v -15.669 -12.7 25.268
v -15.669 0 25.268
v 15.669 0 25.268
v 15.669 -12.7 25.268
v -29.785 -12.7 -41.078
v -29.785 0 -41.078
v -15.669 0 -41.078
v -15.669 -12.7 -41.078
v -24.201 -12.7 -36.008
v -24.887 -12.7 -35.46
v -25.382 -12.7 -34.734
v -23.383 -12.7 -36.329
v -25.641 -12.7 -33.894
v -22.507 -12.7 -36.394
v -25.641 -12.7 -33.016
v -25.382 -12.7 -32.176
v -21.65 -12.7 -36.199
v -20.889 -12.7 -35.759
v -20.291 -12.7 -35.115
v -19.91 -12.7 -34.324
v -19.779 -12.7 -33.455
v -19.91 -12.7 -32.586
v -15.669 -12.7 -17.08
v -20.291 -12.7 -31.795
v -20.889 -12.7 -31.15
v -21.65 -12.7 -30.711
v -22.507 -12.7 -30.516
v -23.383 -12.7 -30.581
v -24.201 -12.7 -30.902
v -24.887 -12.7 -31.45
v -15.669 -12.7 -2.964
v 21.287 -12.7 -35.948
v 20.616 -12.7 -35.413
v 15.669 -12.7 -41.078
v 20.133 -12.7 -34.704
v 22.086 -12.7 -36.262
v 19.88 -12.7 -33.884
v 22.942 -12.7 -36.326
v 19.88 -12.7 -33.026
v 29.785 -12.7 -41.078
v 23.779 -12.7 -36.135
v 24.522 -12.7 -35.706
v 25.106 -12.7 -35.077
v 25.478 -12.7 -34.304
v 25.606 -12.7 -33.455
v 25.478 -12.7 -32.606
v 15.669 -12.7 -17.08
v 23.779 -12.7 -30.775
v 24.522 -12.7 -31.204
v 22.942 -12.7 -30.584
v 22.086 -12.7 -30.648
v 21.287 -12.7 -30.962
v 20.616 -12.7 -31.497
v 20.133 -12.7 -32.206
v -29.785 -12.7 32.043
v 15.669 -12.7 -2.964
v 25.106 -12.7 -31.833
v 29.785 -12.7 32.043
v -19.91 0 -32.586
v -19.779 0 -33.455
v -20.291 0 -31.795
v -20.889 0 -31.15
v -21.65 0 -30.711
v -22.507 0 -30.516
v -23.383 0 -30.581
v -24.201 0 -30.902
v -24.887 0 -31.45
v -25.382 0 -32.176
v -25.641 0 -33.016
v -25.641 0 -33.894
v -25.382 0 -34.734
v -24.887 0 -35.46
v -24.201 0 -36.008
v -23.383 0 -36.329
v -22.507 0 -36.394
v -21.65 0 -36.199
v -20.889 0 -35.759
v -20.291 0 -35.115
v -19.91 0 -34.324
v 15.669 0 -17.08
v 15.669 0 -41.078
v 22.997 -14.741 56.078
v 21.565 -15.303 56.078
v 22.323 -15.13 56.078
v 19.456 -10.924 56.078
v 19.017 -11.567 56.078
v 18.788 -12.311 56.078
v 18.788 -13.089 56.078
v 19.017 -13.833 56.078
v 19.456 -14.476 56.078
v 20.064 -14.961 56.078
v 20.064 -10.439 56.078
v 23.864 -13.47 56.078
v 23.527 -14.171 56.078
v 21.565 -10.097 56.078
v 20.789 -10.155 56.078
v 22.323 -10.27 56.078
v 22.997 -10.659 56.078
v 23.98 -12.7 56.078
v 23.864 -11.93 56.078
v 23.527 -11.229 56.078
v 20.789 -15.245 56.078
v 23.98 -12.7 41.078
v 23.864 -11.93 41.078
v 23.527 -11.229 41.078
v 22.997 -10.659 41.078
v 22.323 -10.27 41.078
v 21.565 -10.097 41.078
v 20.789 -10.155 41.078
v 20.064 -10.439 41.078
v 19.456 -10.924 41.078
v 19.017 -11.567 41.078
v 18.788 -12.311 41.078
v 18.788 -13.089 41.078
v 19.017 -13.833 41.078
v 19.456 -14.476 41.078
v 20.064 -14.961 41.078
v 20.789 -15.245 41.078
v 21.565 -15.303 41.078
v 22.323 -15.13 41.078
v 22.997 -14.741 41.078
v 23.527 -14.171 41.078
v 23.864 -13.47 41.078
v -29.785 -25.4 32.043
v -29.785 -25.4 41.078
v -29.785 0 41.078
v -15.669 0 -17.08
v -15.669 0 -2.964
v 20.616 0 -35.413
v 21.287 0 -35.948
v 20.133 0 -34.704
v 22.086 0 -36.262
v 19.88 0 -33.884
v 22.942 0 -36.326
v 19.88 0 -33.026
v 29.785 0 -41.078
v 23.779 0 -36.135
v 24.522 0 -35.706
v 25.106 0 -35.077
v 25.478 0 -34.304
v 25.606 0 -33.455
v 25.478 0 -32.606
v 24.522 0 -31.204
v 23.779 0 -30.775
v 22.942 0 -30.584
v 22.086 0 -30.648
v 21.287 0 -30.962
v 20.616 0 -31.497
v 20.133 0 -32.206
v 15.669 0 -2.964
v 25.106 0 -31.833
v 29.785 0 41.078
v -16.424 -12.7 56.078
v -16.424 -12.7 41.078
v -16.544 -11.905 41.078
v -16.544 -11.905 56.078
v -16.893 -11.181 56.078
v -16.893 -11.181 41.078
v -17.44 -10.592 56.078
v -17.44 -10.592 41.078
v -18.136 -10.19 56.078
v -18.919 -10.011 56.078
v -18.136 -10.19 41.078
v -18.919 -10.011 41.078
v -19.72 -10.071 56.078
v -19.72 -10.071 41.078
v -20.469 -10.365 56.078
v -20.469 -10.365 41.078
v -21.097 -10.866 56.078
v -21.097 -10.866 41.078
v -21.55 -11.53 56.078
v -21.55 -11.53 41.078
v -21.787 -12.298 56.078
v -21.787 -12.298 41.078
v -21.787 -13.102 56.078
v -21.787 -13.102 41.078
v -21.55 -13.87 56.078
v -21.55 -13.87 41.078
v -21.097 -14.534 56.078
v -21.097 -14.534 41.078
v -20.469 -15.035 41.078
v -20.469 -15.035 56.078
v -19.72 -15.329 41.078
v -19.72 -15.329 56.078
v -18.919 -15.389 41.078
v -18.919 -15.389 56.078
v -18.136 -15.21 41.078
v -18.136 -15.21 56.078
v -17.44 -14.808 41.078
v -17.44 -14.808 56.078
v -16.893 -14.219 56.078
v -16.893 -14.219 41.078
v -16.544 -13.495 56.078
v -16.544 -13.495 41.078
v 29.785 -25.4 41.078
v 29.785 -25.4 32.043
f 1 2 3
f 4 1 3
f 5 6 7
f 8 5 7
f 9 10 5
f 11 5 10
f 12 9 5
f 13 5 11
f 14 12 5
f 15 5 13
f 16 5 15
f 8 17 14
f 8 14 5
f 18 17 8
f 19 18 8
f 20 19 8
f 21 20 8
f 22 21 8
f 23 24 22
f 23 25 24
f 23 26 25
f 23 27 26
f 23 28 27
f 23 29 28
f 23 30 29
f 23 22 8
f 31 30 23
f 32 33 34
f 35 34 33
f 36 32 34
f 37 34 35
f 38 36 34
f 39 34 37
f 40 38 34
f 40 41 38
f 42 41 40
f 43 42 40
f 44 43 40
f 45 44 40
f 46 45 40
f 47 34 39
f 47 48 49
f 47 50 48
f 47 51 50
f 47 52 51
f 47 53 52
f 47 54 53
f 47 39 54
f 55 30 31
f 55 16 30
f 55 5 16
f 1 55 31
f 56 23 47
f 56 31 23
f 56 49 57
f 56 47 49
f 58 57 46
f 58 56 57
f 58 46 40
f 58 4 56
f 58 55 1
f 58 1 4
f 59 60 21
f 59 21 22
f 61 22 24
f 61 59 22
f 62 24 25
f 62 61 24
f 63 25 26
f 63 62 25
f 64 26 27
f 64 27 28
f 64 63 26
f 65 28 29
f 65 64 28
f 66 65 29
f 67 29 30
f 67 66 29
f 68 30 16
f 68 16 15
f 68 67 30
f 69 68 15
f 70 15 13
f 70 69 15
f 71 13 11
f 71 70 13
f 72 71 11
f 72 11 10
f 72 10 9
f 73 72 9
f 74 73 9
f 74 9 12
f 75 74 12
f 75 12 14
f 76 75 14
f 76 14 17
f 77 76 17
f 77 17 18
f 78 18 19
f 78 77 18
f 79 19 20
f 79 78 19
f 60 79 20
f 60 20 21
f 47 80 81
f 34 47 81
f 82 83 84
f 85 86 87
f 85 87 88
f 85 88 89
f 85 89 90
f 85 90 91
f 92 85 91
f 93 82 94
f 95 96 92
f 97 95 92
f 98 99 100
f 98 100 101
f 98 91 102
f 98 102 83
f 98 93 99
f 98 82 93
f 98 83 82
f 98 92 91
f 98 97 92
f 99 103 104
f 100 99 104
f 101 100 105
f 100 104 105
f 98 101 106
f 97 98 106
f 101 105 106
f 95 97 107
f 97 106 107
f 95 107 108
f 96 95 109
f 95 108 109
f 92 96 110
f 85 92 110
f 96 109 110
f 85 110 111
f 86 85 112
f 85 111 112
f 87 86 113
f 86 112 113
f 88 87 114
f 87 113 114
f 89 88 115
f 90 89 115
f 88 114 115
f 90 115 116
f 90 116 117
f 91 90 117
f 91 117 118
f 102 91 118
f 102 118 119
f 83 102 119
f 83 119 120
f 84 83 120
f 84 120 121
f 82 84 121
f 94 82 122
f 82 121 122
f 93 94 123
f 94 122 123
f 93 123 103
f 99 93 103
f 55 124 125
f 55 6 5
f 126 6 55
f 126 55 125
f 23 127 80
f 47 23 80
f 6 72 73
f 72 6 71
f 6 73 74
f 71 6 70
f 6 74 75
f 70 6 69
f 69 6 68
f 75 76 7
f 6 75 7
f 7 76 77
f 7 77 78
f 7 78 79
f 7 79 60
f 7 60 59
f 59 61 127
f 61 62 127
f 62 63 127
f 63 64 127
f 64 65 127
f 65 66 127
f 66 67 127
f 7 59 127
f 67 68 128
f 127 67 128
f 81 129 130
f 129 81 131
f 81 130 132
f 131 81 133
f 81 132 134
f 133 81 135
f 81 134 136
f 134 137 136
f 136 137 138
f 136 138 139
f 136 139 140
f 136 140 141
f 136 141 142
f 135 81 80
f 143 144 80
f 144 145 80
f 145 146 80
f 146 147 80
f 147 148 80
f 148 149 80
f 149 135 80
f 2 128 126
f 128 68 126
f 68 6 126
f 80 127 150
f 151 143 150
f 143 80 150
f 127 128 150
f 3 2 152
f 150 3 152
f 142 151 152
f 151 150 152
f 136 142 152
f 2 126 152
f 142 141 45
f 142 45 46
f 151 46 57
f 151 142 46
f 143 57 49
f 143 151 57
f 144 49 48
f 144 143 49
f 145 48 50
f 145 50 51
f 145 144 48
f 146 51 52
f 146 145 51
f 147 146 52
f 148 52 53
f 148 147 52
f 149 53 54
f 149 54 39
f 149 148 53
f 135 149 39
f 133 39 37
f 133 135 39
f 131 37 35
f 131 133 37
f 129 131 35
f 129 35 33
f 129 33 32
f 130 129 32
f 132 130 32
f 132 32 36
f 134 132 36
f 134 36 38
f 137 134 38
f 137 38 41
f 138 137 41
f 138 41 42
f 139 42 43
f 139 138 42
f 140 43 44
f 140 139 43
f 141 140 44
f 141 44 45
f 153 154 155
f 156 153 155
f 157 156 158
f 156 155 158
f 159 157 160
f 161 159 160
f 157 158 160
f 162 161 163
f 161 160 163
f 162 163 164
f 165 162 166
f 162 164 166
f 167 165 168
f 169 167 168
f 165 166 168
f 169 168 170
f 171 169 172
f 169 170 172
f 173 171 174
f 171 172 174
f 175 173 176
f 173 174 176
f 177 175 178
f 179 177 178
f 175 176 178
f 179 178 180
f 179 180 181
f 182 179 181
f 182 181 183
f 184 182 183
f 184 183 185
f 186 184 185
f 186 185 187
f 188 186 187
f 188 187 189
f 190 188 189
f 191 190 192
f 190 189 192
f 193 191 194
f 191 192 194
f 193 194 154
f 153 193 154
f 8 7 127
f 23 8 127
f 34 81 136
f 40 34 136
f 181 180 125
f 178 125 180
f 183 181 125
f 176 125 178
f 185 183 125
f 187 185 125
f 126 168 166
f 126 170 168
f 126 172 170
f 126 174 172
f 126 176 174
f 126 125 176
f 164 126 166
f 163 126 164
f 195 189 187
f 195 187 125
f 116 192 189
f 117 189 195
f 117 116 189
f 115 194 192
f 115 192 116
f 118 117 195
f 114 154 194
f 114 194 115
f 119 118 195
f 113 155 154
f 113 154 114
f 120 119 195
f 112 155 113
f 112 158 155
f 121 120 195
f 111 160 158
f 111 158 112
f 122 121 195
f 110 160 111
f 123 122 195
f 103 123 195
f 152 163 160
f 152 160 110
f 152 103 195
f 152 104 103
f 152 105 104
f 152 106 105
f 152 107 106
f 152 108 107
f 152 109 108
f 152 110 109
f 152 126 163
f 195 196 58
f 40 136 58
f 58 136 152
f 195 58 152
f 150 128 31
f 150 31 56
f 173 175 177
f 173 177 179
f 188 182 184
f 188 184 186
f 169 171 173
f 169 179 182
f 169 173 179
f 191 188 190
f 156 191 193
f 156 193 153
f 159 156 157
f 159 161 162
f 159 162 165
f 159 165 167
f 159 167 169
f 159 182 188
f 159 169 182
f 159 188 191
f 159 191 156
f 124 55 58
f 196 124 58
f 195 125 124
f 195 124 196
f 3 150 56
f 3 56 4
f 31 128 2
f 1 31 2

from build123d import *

# Parameters (mm, degrees)
F0_R     = 2.947507
F0_R_2   = 2.879107
F0_W     = 31.337534
F0_H     = 28.232014
F1_DEPTH = 12.7
F0_W_2   = 59.569548
F0_H_2   = 9.034242
F2_DEPTH = 25.4
F3_R     = 2.696098
F4_DEPTH = 15
F3_R_2   = 2.610721
F5_DEPTH = 15


with BuildPart() as f1:
    # F0 (on Front) → F1 (new body)
    with BuildSketch(Plane.XZ):
        Polygon((29.784774, 32.043338), (-29.784774, 32.043338), (-29.784774, -41.07758), (-15.668767, -41.07758), (-15.668767, -17.080368), (15.668767, -17.080368), (15.668767, -41.07758), (29.784774, -41.07758), align=None)
        with Locations((-22.72677, -33.454936)):
            Circle(F0_R, mode=Mode.SUBTRACT)
        with Locations((22.72677, -33.454936)):
            Circle(F0_R_2, mode=Mode.SUBTRACT)
        with Locations((0, 11.151646)):
            Rectangle(F0_W, F0_H, mode=Mode.SUBTRACT)
    extrude(amount=F1_DEPTH)

    # F0 (on Front) → F2 (join)
    with BuildSketch(Plane.XZ):
        with Locations((0, 36.560459)):
            Rectangle(F0_W_2, F0_H_2)
    extrude(amount=F2_DEPTH)

    # F3 (on face) → F4 (join)
    with BuildSketch(Plane.XY.offset(41.07758)):
        with Locations((-19.120524, -12.7)):
            Circle(F3_R)
    extrude(amount=F4_DEPTH)

    # F3 (on face) → F5 (join)
    with BuildSketch(Plane.XY.offset(41.07758)):
        with Locations((21.369504, -12.7)):
            Circle(F3_R_2)
    extrude(amount=F5_DEPTH)


solid = f1.part
